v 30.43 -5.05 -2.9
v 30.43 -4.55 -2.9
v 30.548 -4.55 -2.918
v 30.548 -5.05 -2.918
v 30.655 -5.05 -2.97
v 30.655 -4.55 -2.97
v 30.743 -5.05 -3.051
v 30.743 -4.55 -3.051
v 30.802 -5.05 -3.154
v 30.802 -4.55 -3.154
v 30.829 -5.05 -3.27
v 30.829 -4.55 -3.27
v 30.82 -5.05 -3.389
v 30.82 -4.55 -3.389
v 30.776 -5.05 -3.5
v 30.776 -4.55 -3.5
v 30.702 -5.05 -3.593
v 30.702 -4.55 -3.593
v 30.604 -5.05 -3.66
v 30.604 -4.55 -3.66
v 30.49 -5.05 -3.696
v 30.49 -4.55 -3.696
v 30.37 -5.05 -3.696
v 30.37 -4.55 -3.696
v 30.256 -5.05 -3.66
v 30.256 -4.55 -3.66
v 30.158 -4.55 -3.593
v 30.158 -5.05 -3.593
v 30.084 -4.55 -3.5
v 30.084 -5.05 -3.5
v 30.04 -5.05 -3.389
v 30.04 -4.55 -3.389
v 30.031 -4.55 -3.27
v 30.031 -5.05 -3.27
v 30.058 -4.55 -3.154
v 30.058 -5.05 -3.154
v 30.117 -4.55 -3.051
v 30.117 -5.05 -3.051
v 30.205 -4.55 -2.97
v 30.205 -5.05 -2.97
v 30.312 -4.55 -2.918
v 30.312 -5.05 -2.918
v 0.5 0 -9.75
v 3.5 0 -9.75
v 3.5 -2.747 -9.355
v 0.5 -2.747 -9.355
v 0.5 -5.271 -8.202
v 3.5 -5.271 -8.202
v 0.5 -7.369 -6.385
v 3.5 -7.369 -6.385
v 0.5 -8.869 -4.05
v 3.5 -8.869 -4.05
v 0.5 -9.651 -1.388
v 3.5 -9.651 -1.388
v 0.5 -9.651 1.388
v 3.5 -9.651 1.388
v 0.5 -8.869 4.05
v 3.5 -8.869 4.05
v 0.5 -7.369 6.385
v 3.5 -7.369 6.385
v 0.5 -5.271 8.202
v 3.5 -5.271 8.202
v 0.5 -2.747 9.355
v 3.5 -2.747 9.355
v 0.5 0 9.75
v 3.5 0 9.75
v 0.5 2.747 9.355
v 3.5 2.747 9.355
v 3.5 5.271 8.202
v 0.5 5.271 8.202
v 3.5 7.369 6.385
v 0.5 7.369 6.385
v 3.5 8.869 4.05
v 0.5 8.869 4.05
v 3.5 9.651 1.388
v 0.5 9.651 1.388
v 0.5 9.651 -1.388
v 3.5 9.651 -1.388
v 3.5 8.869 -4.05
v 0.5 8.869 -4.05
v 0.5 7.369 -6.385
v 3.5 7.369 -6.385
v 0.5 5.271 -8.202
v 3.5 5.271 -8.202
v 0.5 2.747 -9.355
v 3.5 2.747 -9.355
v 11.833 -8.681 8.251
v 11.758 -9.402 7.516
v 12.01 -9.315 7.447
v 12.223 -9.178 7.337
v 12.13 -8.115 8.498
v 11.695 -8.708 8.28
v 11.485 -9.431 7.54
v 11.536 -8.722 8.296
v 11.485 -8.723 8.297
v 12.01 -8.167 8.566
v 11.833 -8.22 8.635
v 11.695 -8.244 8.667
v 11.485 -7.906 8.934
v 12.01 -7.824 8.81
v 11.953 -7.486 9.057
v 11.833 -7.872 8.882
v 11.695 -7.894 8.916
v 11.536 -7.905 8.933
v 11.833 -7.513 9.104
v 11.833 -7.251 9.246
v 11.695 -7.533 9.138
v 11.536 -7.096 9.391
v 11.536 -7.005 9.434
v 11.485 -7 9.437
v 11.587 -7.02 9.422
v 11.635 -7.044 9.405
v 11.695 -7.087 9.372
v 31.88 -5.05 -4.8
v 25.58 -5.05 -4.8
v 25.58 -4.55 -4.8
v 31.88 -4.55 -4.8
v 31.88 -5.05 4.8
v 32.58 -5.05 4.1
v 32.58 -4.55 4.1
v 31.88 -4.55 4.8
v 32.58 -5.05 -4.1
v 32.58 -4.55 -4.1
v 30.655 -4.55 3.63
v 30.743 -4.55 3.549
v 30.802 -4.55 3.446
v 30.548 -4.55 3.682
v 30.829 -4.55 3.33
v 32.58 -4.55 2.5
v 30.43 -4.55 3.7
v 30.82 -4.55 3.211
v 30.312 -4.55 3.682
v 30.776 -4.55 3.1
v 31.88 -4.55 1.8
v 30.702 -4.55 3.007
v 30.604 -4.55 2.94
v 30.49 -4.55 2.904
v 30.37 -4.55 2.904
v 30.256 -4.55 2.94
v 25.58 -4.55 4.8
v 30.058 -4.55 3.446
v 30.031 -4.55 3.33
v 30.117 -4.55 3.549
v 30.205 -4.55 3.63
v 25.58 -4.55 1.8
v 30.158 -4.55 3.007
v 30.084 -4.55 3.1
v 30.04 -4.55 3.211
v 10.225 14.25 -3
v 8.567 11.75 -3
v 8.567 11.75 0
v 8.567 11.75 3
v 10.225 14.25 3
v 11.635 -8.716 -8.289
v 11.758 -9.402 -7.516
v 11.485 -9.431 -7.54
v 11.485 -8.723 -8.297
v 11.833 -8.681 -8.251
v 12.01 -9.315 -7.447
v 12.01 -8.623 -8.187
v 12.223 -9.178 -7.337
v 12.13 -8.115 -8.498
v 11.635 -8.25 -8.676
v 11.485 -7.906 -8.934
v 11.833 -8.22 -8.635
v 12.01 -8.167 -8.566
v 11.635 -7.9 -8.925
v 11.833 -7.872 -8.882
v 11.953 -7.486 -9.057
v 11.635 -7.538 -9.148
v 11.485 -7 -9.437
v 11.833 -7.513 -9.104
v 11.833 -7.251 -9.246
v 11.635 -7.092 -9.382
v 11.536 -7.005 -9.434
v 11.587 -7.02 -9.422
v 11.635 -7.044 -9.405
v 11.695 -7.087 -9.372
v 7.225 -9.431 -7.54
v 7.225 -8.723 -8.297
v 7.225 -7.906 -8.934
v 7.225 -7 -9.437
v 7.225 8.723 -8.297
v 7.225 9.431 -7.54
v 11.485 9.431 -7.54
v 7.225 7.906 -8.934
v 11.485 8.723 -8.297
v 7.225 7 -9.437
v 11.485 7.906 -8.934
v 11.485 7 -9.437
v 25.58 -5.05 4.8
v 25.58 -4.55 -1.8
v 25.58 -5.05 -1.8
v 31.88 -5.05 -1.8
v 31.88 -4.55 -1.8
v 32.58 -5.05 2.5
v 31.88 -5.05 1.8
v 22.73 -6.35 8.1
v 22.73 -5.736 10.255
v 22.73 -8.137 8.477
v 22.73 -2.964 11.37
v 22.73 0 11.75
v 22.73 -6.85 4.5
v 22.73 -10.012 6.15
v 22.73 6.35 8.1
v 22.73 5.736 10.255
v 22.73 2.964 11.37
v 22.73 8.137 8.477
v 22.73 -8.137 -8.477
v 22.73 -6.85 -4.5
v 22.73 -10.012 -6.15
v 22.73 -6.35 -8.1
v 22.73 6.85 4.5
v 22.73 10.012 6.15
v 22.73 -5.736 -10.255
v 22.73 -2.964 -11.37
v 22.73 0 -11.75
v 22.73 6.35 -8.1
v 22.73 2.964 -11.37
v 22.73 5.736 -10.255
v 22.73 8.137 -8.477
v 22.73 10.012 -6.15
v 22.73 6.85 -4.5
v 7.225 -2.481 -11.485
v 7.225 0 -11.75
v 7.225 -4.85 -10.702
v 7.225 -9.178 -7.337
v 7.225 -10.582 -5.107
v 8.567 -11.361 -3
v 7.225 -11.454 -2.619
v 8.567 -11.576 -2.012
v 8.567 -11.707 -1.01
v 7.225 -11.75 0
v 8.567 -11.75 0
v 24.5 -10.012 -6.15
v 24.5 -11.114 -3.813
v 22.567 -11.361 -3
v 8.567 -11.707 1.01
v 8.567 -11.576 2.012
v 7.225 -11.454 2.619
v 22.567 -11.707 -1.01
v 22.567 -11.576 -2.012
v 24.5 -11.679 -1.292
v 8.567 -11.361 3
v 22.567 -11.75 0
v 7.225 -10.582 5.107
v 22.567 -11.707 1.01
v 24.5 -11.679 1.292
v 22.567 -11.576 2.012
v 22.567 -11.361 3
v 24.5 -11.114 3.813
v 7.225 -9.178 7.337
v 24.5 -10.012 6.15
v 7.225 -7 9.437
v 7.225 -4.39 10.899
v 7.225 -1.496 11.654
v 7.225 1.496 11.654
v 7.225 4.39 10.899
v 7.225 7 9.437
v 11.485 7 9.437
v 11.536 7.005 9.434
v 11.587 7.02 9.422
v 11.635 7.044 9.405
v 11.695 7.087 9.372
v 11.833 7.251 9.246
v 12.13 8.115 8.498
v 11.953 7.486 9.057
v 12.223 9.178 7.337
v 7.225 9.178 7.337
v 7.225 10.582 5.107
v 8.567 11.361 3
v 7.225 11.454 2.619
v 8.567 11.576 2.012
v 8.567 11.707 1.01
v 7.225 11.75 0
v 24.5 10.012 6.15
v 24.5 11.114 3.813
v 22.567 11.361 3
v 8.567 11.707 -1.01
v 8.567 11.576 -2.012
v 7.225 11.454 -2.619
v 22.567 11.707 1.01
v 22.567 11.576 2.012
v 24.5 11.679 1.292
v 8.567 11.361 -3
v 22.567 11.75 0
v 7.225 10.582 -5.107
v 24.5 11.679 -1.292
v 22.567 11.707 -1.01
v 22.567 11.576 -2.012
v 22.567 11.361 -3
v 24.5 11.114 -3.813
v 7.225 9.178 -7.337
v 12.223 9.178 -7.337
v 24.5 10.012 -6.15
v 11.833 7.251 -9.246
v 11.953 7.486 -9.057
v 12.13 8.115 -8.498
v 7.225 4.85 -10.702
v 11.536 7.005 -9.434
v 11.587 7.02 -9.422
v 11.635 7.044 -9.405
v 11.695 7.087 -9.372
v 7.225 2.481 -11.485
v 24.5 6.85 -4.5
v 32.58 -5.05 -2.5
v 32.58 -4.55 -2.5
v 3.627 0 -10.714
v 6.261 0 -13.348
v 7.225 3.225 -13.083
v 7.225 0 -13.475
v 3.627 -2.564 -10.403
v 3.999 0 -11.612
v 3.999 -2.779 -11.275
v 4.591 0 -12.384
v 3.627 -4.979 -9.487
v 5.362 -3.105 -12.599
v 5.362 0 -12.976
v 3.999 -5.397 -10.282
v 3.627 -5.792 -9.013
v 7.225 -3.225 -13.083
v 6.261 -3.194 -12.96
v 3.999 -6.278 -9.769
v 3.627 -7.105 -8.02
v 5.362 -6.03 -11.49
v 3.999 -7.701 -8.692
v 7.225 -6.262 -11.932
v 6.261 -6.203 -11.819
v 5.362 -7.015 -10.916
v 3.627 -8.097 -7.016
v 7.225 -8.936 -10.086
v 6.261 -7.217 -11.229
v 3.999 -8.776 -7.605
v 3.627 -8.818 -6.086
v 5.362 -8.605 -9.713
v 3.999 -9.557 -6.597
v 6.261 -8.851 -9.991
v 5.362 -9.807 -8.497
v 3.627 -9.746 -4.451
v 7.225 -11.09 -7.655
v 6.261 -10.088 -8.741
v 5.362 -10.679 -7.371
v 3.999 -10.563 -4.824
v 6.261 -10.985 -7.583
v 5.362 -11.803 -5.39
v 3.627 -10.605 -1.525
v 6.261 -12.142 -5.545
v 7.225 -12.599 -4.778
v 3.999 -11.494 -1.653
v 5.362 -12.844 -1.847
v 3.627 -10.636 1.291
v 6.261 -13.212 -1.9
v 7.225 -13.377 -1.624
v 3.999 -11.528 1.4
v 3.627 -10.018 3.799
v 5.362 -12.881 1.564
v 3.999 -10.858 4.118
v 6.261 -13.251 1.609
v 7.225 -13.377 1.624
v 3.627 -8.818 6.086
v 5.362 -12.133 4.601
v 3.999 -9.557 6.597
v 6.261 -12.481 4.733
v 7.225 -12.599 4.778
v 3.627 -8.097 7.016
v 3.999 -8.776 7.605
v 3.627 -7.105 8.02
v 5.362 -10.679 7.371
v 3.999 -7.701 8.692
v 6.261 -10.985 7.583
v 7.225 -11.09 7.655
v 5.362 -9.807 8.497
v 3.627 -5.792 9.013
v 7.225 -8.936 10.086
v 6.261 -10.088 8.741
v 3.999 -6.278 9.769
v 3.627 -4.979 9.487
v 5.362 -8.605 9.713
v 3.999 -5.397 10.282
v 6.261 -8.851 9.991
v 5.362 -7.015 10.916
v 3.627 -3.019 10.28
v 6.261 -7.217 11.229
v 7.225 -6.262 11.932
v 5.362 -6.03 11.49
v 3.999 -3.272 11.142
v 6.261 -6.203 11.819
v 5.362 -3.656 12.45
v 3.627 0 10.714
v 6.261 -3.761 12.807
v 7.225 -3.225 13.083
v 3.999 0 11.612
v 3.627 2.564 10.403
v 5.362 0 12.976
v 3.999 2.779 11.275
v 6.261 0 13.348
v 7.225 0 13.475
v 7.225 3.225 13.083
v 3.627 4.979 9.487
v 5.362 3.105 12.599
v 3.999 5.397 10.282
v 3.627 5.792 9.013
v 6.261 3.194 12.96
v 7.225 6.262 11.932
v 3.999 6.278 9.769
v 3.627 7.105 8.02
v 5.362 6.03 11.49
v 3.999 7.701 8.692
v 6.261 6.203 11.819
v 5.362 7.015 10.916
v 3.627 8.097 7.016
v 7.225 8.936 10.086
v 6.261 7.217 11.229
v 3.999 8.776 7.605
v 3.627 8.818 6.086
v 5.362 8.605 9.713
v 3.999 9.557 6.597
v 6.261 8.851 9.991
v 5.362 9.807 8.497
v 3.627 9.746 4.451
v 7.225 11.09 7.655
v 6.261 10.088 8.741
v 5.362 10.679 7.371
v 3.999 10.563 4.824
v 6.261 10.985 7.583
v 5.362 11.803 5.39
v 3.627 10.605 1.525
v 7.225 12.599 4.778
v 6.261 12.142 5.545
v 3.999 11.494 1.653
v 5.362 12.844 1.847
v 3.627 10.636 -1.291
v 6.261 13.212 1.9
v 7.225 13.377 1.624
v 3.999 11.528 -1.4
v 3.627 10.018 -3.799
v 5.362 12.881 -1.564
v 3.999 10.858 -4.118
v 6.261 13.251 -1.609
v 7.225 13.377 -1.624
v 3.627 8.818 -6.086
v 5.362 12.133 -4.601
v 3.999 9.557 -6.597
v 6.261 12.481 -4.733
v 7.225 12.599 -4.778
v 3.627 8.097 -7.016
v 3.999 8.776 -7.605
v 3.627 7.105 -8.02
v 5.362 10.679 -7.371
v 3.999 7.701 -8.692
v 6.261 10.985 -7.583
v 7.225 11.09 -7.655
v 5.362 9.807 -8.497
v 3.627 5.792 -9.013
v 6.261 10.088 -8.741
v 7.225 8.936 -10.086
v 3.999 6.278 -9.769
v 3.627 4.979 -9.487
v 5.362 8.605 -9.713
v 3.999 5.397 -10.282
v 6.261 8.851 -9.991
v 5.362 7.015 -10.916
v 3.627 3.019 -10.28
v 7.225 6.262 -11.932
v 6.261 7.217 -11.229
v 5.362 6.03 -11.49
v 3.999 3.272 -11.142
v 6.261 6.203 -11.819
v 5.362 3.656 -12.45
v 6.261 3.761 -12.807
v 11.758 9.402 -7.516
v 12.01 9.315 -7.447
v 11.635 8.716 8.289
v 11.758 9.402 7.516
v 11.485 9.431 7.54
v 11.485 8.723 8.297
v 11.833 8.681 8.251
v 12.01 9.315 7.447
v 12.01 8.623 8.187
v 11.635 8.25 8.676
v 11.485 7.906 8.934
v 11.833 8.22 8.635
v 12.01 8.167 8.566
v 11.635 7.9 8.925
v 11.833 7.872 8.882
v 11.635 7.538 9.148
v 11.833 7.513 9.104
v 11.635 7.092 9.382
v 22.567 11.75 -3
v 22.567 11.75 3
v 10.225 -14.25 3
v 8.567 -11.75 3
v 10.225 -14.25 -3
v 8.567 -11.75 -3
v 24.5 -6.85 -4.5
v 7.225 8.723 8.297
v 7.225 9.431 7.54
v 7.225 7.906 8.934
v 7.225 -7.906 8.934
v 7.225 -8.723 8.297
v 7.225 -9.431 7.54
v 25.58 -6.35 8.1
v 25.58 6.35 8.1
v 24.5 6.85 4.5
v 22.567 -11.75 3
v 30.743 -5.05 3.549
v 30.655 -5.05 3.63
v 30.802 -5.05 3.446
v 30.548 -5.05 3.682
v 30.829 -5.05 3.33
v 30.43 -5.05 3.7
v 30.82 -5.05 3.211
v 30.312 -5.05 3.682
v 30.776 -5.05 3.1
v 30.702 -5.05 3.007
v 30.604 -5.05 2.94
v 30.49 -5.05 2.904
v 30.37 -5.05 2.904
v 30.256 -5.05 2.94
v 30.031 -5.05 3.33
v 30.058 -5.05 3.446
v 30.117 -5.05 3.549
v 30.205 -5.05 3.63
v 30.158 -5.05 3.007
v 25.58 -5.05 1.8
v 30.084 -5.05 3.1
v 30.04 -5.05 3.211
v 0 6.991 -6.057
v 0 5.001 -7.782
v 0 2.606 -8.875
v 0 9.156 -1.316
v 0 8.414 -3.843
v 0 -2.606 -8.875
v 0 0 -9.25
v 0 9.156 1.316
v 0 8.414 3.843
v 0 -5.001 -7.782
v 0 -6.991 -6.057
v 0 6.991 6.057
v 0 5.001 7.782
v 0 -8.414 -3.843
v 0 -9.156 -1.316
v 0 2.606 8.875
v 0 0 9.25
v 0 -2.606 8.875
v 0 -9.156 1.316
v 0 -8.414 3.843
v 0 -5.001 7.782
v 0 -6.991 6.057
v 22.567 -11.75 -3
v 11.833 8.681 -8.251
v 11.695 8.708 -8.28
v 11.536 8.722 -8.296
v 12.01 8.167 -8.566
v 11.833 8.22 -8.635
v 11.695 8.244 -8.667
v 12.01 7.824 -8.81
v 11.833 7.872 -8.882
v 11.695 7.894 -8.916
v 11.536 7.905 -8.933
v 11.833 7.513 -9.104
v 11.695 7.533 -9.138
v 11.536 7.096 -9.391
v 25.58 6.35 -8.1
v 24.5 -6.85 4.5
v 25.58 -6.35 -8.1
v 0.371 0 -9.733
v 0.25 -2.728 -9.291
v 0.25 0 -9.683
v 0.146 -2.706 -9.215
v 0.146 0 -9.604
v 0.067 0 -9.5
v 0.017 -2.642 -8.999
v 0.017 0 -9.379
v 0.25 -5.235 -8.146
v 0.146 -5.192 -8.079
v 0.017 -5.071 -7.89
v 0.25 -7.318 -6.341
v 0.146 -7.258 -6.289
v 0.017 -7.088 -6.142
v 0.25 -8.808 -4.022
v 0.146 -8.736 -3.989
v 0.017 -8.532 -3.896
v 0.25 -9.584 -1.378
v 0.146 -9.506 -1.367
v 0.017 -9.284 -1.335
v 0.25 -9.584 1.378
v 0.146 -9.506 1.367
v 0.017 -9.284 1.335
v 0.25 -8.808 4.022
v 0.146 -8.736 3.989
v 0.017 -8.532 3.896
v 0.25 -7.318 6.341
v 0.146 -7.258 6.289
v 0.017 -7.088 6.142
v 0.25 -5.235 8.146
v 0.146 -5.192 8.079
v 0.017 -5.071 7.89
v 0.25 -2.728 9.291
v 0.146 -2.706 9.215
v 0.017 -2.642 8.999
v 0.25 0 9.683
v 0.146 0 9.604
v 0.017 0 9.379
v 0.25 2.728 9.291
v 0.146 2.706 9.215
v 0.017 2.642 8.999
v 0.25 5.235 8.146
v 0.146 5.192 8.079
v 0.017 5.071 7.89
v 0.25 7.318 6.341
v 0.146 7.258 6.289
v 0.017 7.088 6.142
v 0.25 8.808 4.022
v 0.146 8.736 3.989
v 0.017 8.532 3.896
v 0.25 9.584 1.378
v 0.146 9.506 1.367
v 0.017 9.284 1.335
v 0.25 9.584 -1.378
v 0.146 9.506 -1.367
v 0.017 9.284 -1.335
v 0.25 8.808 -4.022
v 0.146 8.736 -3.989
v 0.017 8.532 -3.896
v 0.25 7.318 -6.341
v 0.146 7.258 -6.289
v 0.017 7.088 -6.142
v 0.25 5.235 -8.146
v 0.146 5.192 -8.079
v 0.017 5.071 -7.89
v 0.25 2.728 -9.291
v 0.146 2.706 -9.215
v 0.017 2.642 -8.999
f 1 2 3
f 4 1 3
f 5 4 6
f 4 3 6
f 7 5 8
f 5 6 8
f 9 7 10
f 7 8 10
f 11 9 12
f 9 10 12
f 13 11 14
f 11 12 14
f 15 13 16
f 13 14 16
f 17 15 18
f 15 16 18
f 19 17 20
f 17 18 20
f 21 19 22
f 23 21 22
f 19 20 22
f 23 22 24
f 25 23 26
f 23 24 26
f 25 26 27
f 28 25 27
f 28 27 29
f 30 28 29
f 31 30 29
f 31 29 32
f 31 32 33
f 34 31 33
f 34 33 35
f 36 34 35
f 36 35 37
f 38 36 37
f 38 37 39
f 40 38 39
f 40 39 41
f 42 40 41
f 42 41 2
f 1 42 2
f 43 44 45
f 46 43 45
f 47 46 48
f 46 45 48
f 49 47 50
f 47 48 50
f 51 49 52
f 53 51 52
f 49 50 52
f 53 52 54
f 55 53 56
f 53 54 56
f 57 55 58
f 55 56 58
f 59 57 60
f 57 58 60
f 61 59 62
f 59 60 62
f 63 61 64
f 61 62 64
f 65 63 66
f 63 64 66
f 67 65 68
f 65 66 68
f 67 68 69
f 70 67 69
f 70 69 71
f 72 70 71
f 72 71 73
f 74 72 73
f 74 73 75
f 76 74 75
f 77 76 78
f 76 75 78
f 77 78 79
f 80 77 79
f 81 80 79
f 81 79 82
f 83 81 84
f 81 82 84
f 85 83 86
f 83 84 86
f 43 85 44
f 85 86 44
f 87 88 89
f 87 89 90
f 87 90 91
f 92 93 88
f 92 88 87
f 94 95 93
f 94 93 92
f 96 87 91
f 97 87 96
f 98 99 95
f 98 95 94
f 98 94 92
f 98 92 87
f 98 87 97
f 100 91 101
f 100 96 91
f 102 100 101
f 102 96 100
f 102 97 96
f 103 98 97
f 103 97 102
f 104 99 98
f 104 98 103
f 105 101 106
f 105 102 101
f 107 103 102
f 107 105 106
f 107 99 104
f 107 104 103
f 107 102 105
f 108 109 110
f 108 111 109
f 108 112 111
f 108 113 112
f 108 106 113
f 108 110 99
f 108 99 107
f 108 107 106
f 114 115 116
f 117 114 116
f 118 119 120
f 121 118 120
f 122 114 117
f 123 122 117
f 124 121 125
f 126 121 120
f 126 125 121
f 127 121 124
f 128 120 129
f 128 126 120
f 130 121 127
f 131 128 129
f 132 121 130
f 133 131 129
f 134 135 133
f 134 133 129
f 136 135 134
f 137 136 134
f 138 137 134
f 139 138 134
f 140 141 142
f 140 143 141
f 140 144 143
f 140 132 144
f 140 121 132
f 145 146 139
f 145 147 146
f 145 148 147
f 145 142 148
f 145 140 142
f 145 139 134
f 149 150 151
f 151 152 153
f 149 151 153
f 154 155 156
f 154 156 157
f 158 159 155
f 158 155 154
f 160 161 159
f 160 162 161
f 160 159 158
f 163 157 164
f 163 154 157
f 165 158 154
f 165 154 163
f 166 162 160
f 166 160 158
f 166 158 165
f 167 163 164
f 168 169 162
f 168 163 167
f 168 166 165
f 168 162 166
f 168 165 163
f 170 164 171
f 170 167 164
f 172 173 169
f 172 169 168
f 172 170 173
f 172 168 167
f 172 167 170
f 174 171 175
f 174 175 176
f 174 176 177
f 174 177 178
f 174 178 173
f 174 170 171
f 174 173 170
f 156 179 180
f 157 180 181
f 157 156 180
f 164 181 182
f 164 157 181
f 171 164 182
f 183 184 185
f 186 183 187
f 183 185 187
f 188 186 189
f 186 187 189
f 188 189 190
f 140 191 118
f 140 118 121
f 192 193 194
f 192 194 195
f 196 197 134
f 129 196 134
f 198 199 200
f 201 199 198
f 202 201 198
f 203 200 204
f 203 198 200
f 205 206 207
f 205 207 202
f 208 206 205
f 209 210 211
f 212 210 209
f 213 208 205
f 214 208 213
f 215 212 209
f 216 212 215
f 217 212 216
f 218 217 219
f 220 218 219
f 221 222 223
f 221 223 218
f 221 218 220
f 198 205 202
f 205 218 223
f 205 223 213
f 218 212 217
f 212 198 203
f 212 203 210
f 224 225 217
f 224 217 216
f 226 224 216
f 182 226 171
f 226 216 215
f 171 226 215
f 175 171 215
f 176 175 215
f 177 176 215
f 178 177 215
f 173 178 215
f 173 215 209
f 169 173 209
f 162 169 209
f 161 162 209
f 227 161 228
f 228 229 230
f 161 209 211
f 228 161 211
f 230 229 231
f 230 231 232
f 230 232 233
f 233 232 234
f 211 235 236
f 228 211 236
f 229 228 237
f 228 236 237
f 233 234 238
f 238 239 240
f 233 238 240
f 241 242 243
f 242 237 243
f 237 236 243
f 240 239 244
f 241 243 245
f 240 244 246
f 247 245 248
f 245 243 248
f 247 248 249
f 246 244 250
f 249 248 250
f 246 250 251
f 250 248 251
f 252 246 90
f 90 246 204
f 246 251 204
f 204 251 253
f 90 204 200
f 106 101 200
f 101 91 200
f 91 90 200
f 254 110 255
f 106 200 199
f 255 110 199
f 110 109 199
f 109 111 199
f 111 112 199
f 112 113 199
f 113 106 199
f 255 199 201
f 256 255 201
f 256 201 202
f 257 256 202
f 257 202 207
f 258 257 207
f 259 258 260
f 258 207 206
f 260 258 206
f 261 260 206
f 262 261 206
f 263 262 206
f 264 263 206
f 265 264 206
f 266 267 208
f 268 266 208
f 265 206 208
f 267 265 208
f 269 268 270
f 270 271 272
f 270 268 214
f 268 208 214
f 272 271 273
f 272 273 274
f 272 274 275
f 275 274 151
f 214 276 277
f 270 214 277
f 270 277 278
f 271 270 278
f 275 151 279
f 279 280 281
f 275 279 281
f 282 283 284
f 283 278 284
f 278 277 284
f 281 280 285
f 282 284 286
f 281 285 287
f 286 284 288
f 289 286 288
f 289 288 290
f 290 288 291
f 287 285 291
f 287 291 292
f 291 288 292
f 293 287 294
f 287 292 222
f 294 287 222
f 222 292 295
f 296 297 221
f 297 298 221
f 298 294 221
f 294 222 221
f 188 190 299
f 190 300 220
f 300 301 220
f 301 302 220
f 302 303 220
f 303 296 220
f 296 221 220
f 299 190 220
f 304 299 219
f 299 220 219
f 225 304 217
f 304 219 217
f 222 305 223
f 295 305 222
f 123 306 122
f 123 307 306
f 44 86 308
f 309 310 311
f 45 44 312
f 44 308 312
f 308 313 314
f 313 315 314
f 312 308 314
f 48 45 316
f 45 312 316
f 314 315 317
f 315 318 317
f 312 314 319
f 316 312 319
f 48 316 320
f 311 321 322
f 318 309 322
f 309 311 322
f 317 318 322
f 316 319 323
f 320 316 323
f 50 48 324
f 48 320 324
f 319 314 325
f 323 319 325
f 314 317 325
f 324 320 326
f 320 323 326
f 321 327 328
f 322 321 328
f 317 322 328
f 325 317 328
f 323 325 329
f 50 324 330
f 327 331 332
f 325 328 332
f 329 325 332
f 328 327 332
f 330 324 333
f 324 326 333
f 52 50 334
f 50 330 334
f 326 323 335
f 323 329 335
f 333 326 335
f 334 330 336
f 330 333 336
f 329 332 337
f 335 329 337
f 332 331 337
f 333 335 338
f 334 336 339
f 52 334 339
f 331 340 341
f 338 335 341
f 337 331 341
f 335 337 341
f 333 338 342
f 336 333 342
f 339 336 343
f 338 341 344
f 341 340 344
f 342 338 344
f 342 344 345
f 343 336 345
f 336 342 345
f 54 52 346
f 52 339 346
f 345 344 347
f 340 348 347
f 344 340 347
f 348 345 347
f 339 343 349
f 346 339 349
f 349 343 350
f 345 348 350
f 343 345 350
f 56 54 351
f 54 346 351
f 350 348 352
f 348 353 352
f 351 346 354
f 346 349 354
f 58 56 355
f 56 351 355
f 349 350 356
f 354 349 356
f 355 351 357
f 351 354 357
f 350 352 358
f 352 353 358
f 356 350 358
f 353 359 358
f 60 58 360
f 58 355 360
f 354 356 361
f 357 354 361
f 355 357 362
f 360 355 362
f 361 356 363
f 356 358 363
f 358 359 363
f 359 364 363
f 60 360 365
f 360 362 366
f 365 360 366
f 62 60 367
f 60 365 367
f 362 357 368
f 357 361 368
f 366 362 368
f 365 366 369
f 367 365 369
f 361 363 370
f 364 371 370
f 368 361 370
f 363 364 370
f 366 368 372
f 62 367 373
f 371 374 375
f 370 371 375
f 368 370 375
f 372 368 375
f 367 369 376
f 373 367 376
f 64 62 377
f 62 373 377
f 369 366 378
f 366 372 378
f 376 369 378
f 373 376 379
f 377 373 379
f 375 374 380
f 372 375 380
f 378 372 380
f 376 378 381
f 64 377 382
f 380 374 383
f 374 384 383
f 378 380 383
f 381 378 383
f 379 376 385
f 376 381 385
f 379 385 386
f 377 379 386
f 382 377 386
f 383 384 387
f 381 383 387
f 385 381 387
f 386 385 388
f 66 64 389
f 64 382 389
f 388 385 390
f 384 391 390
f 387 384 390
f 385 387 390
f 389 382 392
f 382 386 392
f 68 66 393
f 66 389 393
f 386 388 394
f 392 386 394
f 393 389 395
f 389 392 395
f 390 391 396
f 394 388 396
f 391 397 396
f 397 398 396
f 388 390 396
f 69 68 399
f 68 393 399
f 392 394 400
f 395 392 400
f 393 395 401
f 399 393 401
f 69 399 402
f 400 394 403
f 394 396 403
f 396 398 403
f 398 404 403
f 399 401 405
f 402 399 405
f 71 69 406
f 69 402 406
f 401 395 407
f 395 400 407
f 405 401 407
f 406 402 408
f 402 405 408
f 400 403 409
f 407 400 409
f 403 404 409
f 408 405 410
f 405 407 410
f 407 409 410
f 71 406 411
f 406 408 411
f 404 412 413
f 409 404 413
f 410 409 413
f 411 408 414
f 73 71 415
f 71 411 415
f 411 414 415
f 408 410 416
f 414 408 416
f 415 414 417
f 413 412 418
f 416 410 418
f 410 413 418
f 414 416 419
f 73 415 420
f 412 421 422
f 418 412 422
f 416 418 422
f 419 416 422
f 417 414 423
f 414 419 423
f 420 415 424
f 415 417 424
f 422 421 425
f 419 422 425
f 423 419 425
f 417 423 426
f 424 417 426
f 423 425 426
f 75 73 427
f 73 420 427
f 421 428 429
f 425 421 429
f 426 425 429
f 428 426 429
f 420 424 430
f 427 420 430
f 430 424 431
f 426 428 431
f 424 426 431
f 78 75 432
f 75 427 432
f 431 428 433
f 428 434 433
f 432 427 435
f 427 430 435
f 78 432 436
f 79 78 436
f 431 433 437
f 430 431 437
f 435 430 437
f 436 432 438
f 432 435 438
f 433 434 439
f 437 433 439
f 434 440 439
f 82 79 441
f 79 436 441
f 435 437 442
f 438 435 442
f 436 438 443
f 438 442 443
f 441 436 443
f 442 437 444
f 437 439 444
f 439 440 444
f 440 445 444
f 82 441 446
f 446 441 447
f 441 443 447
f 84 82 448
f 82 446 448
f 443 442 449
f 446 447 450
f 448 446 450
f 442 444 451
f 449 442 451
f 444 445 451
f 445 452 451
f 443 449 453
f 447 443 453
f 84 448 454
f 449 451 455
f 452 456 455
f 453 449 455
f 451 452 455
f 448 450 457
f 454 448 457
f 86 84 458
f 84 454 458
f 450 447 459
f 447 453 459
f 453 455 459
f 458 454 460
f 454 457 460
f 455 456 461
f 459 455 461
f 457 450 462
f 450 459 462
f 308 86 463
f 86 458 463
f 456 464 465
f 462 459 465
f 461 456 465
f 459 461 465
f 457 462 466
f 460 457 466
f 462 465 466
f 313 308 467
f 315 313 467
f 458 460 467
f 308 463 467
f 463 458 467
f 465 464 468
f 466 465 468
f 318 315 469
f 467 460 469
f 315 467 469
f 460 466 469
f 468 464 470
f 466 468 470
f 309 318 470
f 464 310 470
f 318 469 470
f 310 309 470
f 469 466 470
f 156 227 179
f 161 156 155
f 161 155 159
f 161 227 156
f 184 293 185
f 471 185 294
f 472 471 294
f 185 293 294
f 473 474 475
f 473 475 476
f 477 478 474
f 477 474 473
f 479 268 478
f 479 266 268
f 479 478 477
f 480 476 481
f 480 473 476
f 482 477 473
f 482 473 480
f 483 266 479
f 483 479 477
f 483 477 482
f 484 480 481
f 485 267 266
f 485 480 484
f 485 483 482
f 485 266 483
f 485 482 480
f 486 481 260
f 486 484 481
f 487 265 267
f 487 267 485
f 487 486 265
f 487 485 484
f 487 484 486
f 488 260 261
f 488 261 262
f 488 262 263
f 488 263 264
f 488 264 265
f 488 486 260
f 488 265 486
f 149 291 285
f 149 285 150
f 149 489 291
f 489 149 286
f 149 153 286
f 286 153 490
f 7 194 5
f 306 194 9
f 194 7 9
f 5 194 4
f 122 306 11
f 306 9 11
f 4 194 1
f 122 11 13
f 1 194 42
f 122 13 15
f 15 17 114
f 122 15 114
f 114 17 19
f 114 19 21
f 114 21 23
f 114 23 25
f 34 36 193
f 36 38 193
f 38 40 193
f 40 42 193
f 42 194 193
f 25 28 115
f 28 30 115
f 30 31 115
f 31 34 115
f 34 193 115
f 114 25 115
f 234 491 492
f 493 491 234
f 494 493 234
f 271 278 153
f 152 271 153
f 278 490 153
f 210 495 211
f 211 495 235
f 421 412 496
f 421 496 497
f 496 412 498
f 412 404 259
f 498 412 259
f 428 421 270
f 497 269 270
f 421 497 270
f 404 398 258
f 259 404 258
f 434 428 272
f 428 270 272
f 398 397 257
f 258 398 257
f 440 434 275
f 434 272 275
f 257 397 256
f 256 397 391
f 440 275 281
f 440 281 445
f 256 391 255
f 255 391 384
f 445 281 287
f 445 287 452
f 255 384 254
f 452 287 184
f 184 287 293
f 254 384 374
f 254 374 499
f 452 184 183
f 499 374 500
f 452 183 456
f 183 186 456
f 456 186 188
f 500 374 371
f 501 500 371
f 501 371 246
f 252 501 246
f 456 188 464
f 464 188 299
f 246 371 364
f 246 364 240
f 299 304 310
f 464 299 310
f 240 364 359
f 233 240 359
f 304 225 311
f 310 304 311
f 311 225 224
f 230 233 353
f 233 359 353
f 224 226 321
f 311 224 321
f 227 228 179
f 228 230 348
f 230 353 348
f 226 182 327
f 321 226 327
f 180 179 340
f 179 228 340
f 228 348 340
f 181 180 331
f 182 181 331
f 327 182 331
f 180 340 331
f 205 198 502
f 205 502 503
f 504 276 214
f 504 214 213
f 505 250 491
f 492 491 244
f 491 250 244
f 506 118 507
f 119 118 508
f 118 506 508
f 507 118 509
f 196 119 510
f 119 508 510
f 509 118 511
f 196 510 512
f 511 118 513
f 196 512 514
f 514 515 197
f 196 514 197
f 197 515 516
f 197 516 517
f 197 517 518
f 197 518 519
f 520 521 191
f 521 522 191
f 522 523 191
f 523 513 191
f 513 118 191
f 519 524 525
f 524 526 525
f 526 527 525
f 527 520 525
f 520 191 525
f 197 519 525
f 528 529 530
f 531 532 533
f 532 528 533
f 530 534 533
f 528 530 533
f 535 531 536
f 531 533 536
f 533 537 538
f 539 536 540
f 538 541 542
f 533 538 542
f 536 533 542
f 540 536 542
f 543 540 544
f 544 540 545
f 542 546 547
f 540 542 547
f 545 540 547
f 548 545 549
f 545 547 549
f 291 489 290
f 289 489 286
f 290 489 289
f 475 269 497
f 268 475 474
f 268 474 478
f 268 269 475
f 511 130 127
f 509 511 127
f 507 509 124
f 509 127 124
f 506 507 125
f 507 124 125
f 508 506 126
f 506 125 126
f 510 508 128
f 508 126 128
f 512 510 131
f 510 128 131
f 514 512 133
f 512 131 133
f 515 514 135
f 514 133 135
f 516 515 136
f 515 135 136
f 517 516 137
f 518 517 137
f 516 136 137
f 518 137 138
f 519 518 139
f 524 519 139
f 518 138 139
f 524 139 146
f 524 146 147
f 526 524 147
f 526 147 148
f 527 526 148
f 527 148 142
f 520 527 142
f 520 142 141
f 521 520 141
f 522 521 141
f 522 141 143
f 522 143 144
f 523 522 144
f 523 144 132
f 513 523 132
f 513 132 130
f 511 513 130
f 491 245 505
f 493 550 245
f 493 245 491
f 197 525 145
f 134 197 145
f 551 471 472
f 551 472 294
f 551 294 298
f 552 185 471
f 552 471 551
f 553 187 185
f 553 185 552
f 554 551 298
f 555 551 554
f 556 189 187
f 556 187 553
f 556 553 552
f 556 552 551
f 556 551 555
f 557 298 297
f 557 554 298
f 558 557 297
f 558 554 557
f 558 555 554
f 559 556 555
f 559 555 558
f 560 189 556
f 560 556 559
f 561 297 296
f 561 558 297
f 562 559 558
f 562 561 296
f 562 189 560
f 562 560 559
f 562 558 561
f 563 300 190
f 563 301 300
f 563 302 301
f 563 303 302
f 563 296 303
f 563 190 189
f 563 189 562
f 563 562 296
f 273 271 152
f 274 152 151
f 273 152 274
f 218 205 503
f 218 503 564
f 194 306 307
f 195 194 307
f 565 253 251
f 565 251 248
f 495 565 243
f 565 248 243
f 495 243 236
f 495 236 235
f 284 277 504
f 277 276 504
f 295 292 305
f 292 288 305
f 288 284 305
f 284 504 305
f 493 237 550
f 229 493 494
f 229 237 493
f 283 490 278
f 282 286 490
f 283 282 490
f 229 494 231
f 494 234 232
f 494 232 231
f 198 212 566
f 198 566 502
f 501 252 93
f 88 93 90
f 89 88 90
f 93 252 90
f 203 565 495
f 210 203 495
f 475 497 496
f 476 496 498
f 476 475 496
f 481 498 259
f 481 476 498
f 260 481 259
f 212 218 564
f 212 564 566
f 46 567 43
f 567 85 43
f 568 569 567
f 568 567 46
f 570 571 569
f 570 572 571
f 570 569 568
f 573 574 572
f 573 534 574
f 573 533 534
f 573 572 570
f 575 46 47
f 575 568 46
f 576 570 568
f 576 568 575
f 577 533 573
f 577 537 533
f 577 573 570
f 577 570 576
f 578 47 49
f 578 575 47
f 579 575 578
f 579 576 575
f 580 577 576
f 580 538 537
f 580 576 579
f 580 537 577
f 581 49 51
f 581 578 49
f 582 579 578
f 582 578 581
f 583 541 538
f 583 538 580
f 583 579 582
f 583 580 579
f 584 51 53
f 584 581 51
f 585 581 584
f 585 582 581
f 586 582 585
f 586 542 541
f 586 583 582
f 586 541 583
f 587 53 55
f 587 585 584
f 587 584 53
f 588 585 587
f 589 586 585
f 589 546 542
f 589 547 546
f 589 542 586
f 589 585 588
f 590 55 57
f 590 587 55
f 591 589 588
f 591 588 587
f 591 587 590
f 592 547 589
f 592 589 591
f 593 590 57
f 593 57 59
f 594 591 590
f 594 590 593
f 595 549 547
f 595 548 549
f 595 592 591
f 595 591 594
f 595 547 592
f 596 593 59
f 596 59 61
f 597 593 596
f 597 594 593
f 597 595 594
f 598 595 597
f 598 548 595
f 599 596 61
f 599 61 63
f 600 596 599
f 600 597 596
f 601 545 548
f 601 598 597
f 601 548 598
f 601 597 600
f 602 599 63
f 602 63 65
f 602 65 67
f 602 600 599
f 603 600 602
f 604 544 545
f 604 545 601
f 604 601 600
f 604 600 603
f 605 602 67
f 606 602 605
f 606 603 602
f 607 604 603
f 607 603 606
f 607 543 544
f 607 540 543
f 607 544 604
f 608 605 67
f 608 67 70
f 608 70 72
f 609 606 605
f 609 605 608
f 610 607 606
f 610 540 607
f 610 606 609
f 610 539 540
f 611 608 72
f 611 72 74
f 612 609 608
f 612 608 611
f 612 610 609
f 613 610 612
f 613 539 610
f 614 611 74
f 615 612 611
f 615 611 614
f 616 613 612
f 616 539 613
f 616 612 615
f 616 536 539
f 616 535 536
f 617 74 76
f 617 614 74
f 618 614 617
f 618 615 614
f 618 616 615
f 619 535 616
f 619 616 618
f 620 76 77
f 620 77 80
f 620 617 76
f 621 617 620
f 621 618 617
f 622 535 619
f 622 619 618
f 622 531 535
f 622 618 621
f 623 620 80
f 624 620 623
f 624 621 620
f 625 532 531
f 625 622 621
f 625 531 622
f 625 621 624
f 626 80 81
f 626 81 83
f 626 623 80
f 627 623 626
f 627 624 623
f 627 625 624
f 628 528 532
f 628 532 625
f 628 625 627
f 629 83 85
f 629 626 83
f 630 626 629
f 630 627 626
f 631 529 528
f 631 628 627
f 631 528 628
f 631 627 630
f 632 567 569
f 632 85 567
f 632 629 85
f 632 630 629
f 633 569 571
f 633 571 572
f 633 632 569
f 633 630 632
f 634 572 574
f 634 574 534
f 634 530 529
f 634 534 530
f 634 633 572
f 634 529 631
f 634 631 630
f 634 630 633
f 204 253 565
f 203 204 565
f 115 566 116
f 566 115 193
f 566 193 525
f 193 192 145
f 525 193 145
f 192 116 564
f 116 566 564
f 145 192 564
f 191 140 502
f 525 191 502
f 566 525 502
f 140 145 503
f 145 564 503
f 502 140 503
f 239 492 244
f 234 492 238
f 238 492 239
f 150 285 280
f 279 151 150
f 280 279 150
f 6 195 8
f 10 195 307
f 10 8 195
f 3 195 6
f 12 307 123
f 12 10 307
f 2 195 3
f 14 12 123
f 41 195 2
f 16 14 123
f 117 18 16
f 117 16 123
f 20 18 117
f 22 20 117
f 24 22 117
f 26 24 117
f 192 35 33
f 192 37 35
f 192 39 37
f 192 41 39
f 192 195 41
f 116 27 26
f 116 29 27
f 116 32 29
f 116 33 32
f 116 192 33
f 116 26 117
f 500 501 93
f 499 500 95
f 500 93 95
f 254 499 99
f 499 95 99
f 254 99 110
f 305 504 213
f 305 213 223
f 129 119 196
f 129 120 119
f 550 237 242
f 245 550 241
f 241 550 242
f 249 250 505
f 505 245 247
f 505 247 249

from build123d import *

# Parameters (mm, degrees)
BOSS_EXTRUDE4_START = 5.26
BOSS_EXTRUDE4_DEPTH = 5.26
FILLET2_R           = 1
SKETCH8_OUTSIDE_W   = 38.012
SKETCH8_OUTSIDE_H   = 38.012
CUT_EXTRUDE2_DEPTH  = 1.77
BOSS_EXTRUDE1_DEPTH = 2.85
SKETCH3_W           = 3.0000000000000004
SKETCH3_H           = 0.5
SKETCH3_W_2         = 3.000000000000001
BOSS_EXTRUDE2_DEPTH = 7
SKETCH4_R           = 0.40000000000000124
CUT_EXTRUDE1_DEPTH  = 40.59712936066199
CHAMFER1_SIZE       = 0.7
BOSS_EXTRUDE3_DEPTH = 3
FILLET1_R           = 0.5


with BuildPart() as part:
    # Sketch1 → Revolve1 (revolve)
    with BuildSketch(Plane.XY, mode=Mode.PRIVATE) as revolve1_sk:
        with BuildLine():
            Line((0, 0), (0, 9.75))
            Line((0, 9.75), (3.4999999999999996, 9.749999999999998))
            ThreePointArc((3.4999999999999996, 9.749999999999998), (4.591027240080107, 12.383972759919889), (7.224999999999997, 13.474999999999998))
            Line((7.224999999999997, 13.474999999999998), (7.224999999999998, 11.75))
            Line((7.224999999999998, 11.75), (24.5, 11.75))
            Line((24.5, 11.75), (24.5, 0))
            Line((24.5, 0), (0, 0))
        make_face()
    revolve(revolve1_sk.sketch.rotate(Axis((24.5, 0, 0), (-1, 0, 0)), 90), axis=Axis((24.5, 0, 0), (-1, 0, 0)))

    # Sketch7 → Boss-Extrude4 (add)
    with BuildSketch(Plane(origin=(7.224999999999997, 0, 0), x_dir=(0, 0, -1), z_dir=(1, 0, 0)).offset(BOSS_EXTRUDE4_START)):
        with BuildLine():
            Line((-7.337277205884233, 9.177519447215122), (-7.540223171153369, 9.431365729797664))
            ThreePointArc((-7.540223171153369, 9.431365729797664), (-8.631515815707116, 8.327069376529131), (-9.437293044088438, 7))
            ThreePointArc((-9.437293044088438, 7), (-8.457656265394512, 8.156626171183342), (-7.337277205884233, 9.177519447215122))
        make_face()
        with BuildLine():
            Line((-7.337277205884229, -9.177519447215122), (-7.540223171153365, -9.431365729797664))
            ThreePointArc((-7.540223171153365, -9.431365729797664), (-8.631515815707113, -8.327069376529131), (-9.437293044088431, -7))
            ThreePointArc((-9.437293044088431, -7), (-8.457656265394512, -8.15662617118334), (-7.337277205884229, -9.177519447215122))
        make_face()
        with BuildLine():
            Line((7.337277205884229, -9.177519447215122), (7.540223171153365, -9.431365729797664))
            ThreePointArc((7.540223171153365, -9.431365729797664), (8.631515815707113, -8.327069376529131), (9.437293044088431, -7))
            ThreePointArc((9.437293044088431, -7), (8.45765626539451, -8.156626171183342), (7.337277205884229, -9.177519447215122))
        make_face()
        with BuildLine():
            Line((7.337277205884233, 9.177519447215122), (7.540223171153369, 9.431365729797664))
            ThreePointArc((7.540223171153369, 9.431365729797664), (8.631515815707118, 8.32706937652913), (9.437293044088438, 7))
            ThreePointArc((9.437293044088438, 7), (8.457656265394514, 8.15662617118334), (7.337277205884233, 9.177519447215122))
        make_face()
    extrude(amount=-BOSS_EXTRUDE4_DEPTH)

    # Fillet2
    # the kernel refuses this fillet: 1 mm, written as the material it takes off along each edge
    with BuildSketch(Plane(origin=(12.484999999999996, -4.232653152686616, 3.383937203973504), x_dir=(0, -0.9556882368173963, 0.2943806957136558), z_dir=(0, -0.2943806957136558, -0.9556882368173963))) as fillet2_piece_1_section:
        with BuildLine():
            CenterArc((6.655924090642022 - FILLET2_R, FILLET2_R), FILLET2_R, 270, 90)
            Line((6.655924090642022 - FILLET2_R, 0), (6.655924090642022, 0))
            Line((6.655924090642022, 0), (6.6559240906420225, FILLET2_R))
        make_face()
    fillet2_piece_1 = revolve(axis=Axis((12.484999999999996, -4.232653152686616, 3.383937203973504), (-1, 0, 0)), revolution_arc=69.83301403972071, mode=Mode.PRIVATE)
    fillet2_piece_1 = fillet2_piece_1 - Plane(origin=(12.185339920044097, 0, 0), x_dir=(0, 1.1e-16, -1), z_dir=(1, 0, 0)) * Cylinder(11.75, 27, mode=Mode.PRIVATE)
    add(fillet2_piece_1, mode=Mode.SUBTRACT)
    with BuildSketch(Plane(origin=(12.484999999999996, -4.232653152686616, -3.383937203973504), x_dir=(0, -0.9556882368173963, -0.2943806957136558), z_dir=(0, -0.2943806957136558, 0.9556882368173963))) as fillet2_piece_2_section:
        with BuildLine():
            CenterArc((6.655924090642022 - FILLET2_R, -FILLET2_R), FILLET2_R, 0, 90)
            Line((6.655924090642022 - FILLET2_R, 0), (6.655924090642022, 0))
            Line((6.655924090642022, 0), (6.6559240906420225, -FILLET2_R))
        make_face()
    fillet2_piece_2 = revolve(axis=Axis((12.484999999999996, -4.232653152686616, -3.383937203973504), (1, 0, 0)), revolution_arc=69.83301403972071, mode=Mode.PRIVATE)
    fillet2_piece_2 = fillet2_piece_2 - Plane(origin=(12.185339900483468, 0, 0), x_dir=(0, 1.1e-16, -1), z_dir=(1, 0, 0)) * Cylinder(11.75, 27, mode=Mode.PRIVATE)
    add(fillet2_piece_2, mode=Mode.SUBTRACT)
    with BuildSketch(Plane(origin=(12.484999999999996, 4.2326531526865825, -3.383937203973474), x_dir=(0, 0.9556882368173955, -0.29438069571365894), z_dir=(0, 0.29438069571365894, 0.9556882368173955))) as fillet2_piece_3_section:
        with BuildLine():
            CenterArc((6.65592409064207 - FILLET2_R, FILLET2_R), FILLET2_R, 270, 90)
            Line((6.65592409064207 - FILLET2_R, 0), (6.65592409064207, 0))
            Line((6.65592409064207, 0), (6.65592409064207, FILLET2_R))
        make_face()
    fillet2_piece_3 = revolve(axis=Axis((12.484999999999996, 4.2326531526865825, -3.383937203973474), (-1, 0, 0)), revolution_arc=69.83301403972023, mode=Mode.PRIVATE)
    fillet2_piece_3 = fillet2_piece_3 - Plane(origin=(12.185339920045562, 0, 0), x_dir=(0, 1.1e-16, -1), z_dir=(1, 0, 0)) * Cylinder(11.75, 27, mode=Mode.PRIVATE)
    add(fillet2_piece_3, mode=Mode.SUBTRACT)
    with BuildSketch(Plane(origin=(12.484999999999996, 4.232653152686593, 3.3839372039734887), x_dir=(0, 0.955688236817396, 0.29438069571365705), z_dir=(0, 0.29438069571365705, -0.955688236817396))) as fillet2_piece_4_section:
        with BuildLine():
            CenterArc((6.65592409064205 - FILLET2_R, -FILLET2_R), FILLET2_R, 0, 89.99999999999994)
            Line((6.65592409064205 - FILLET2_R, 0), (6.65592409064205, 0))
            Line((6.65592409064205, 0), (6.655924090642049, -FILLET2_R))
        make_face()
    fillet2_piece_4 = revolve(axis=Axis((12.484999999999996, 4.232653152686593, 3.3839372039734887), (1, 0, 0)), revolution_arc=69.83301403972044, mode=Mode.PRIVATE)
    fillet2_piece_4 = fillet2_piece_4 - Plane(origin=(12.185339900321193, 0, 0), x_dir=(0, 1.1e-16, -1), z_dir=(1, 0, 0)) * Cylinder(11.75, 27, mode=Mode.PRIVATE)
    add(fillet2_piece_4, mode=Mode.SUBTRACT)

    # Sketch8 outside → Cut-Extrude2 (cut)
    with BuildSketch(Plane(origin=(24.5, 0, 0), x_dir=(0, 0, -1), z_dir=(1, 0, 0))):
        Rectangle(SKETCH8_OUTSIDE_W, SKETCH8_OUTSIDE_H)
        with BuildLine():
            Line((-6.1499999999999995, 10.011992808627065), (-4.5, 6.85))
            Line((-4.5, 6.85), (4.5, 6.85))
            Line((4.5, 6.85), (6.1499999999999995, 10.011992808627065))
            ThreePointArc((6.1499999999999995, 10.011992808627065), (7.2e-16, 11.750000000000002), (-6.1499999999999995, 10.011992808627065))
        make_face(mode=Mode.SUBTRACT)
        with BuildLine():
            Line((4.5, -6.85), (6.1499999999999995, -10.011992808627065))
            ThreePointArc((6.1499999999999995, -10.011992808627065), (7.2e-16, -11.750000000000002), (-6.1499999999999995, -10.011992808627065))
            Line((-6.1499999999999995, -10.011992808627065), (-4.5, -6.85))
            Line((-4.5, -6.85), (4.5, -6.85))
        make_face(mode=Mode.SUBTRACT)
    extrude(amount=-CUT_EXTRUDE2_DEPTH, mode=Mode.SUBTRACT)

    # Sketch2 → Boss-Extrude1 (add)
    with BuildSketch(Plane(origin=(22.73, 0, 0), x_dir=(0, 0, -1), z_dir=(1, 0, 0))):
        Polygon((-8.100000000000001, 6.35), (8.099999999999998, 6.35), (8.1, -6.35), (-8.1, -6.35), align=None)
    extrude(amount=BOSS_EXTRUDE1_DEPTH)

    # Sketch3 → Boss-Extrude2 (add)
    with BuildSketch(Plane(origin=(25.58, 0, 0), x_dir=(0, 0, -1), z_dir=(1, 0, 0))):
        with Locations((-3.3, -4.8)):
            Rectangle(SKETCH3_W, SKETCH3_H)
        with Locations((3.300000000000001, -4.799999999999999)):
            Rectangle(SKETCH3_W_2, SKETCH3_H)
    extrude(amount=BOSS_EXTRUDE2_DEPTH)

    # Sketch4 → Cut-Extrude1 (cut, through all)
    with BuildSketch(Plane(origin=(0, -4.55, 0), x_dir=(-1, 0, 0), z_dir=(0, 1, -6e-17))):
        with Locations(Location((-30.43, 3.2999999999999994, 0), (0, 0, 90))):
            Circle(SKETCH4_R)
        with Locations(Location((-30.43, -3.3000000000000007, 0), (0, 0, 90))):
            Circle(SKETCH4_R)
    extrude(amount=-CUT_EXTRUDE1_DEPTH, mode=Mode.SUBTRACT)

    # Chamfer1
    chamfer1_edges = [part.edges().sort_by_distance(p)[0] for p in [
        (32.58, -4.8, 1.7999999999999996),
        (32.58, -4.8, 4.8),
        (32.58, -4.799999999999999, -4.800000000000002),
        (32.58, -4.799999999999999, -1.8000000000000007),
    ]]
    chamfer(chamfer1_edges, length=CHAMFER1_SIZE)

    # Sketch5 → Boss-Extrude3 (add, symmetric)
    with BuildSketch(Plane.XY):
        Polygon((22.56668760482229, -11.75), (10.224999999999994, -14.25), (8.566687604822294, -11.750000000000002), (8.566687604822294, -10.750000000000002), (22.56668760482229, -10.75), align=None)
        Polygon((8.56668760482229, 10.750000000000005), (8.56668760482229, 11.750000000000005), (10.22499999999999, 14.250000000000004), (22.566687604822288, 11.750000000000007), (22.566687604822288, 10.750000000000007), align=None)
    extrude(amount=BOSS_EXTRUDE3_DEPTH, both=True)

    # Fillet1
    fillet1_edges = [part.edges().sort_by_distance(p)[0] for p in [
        (0, -2.28e-15, 9.75),
    ]]
    fillet(fillet1_edges, radius=FILLET1_R)


solid = part.part
